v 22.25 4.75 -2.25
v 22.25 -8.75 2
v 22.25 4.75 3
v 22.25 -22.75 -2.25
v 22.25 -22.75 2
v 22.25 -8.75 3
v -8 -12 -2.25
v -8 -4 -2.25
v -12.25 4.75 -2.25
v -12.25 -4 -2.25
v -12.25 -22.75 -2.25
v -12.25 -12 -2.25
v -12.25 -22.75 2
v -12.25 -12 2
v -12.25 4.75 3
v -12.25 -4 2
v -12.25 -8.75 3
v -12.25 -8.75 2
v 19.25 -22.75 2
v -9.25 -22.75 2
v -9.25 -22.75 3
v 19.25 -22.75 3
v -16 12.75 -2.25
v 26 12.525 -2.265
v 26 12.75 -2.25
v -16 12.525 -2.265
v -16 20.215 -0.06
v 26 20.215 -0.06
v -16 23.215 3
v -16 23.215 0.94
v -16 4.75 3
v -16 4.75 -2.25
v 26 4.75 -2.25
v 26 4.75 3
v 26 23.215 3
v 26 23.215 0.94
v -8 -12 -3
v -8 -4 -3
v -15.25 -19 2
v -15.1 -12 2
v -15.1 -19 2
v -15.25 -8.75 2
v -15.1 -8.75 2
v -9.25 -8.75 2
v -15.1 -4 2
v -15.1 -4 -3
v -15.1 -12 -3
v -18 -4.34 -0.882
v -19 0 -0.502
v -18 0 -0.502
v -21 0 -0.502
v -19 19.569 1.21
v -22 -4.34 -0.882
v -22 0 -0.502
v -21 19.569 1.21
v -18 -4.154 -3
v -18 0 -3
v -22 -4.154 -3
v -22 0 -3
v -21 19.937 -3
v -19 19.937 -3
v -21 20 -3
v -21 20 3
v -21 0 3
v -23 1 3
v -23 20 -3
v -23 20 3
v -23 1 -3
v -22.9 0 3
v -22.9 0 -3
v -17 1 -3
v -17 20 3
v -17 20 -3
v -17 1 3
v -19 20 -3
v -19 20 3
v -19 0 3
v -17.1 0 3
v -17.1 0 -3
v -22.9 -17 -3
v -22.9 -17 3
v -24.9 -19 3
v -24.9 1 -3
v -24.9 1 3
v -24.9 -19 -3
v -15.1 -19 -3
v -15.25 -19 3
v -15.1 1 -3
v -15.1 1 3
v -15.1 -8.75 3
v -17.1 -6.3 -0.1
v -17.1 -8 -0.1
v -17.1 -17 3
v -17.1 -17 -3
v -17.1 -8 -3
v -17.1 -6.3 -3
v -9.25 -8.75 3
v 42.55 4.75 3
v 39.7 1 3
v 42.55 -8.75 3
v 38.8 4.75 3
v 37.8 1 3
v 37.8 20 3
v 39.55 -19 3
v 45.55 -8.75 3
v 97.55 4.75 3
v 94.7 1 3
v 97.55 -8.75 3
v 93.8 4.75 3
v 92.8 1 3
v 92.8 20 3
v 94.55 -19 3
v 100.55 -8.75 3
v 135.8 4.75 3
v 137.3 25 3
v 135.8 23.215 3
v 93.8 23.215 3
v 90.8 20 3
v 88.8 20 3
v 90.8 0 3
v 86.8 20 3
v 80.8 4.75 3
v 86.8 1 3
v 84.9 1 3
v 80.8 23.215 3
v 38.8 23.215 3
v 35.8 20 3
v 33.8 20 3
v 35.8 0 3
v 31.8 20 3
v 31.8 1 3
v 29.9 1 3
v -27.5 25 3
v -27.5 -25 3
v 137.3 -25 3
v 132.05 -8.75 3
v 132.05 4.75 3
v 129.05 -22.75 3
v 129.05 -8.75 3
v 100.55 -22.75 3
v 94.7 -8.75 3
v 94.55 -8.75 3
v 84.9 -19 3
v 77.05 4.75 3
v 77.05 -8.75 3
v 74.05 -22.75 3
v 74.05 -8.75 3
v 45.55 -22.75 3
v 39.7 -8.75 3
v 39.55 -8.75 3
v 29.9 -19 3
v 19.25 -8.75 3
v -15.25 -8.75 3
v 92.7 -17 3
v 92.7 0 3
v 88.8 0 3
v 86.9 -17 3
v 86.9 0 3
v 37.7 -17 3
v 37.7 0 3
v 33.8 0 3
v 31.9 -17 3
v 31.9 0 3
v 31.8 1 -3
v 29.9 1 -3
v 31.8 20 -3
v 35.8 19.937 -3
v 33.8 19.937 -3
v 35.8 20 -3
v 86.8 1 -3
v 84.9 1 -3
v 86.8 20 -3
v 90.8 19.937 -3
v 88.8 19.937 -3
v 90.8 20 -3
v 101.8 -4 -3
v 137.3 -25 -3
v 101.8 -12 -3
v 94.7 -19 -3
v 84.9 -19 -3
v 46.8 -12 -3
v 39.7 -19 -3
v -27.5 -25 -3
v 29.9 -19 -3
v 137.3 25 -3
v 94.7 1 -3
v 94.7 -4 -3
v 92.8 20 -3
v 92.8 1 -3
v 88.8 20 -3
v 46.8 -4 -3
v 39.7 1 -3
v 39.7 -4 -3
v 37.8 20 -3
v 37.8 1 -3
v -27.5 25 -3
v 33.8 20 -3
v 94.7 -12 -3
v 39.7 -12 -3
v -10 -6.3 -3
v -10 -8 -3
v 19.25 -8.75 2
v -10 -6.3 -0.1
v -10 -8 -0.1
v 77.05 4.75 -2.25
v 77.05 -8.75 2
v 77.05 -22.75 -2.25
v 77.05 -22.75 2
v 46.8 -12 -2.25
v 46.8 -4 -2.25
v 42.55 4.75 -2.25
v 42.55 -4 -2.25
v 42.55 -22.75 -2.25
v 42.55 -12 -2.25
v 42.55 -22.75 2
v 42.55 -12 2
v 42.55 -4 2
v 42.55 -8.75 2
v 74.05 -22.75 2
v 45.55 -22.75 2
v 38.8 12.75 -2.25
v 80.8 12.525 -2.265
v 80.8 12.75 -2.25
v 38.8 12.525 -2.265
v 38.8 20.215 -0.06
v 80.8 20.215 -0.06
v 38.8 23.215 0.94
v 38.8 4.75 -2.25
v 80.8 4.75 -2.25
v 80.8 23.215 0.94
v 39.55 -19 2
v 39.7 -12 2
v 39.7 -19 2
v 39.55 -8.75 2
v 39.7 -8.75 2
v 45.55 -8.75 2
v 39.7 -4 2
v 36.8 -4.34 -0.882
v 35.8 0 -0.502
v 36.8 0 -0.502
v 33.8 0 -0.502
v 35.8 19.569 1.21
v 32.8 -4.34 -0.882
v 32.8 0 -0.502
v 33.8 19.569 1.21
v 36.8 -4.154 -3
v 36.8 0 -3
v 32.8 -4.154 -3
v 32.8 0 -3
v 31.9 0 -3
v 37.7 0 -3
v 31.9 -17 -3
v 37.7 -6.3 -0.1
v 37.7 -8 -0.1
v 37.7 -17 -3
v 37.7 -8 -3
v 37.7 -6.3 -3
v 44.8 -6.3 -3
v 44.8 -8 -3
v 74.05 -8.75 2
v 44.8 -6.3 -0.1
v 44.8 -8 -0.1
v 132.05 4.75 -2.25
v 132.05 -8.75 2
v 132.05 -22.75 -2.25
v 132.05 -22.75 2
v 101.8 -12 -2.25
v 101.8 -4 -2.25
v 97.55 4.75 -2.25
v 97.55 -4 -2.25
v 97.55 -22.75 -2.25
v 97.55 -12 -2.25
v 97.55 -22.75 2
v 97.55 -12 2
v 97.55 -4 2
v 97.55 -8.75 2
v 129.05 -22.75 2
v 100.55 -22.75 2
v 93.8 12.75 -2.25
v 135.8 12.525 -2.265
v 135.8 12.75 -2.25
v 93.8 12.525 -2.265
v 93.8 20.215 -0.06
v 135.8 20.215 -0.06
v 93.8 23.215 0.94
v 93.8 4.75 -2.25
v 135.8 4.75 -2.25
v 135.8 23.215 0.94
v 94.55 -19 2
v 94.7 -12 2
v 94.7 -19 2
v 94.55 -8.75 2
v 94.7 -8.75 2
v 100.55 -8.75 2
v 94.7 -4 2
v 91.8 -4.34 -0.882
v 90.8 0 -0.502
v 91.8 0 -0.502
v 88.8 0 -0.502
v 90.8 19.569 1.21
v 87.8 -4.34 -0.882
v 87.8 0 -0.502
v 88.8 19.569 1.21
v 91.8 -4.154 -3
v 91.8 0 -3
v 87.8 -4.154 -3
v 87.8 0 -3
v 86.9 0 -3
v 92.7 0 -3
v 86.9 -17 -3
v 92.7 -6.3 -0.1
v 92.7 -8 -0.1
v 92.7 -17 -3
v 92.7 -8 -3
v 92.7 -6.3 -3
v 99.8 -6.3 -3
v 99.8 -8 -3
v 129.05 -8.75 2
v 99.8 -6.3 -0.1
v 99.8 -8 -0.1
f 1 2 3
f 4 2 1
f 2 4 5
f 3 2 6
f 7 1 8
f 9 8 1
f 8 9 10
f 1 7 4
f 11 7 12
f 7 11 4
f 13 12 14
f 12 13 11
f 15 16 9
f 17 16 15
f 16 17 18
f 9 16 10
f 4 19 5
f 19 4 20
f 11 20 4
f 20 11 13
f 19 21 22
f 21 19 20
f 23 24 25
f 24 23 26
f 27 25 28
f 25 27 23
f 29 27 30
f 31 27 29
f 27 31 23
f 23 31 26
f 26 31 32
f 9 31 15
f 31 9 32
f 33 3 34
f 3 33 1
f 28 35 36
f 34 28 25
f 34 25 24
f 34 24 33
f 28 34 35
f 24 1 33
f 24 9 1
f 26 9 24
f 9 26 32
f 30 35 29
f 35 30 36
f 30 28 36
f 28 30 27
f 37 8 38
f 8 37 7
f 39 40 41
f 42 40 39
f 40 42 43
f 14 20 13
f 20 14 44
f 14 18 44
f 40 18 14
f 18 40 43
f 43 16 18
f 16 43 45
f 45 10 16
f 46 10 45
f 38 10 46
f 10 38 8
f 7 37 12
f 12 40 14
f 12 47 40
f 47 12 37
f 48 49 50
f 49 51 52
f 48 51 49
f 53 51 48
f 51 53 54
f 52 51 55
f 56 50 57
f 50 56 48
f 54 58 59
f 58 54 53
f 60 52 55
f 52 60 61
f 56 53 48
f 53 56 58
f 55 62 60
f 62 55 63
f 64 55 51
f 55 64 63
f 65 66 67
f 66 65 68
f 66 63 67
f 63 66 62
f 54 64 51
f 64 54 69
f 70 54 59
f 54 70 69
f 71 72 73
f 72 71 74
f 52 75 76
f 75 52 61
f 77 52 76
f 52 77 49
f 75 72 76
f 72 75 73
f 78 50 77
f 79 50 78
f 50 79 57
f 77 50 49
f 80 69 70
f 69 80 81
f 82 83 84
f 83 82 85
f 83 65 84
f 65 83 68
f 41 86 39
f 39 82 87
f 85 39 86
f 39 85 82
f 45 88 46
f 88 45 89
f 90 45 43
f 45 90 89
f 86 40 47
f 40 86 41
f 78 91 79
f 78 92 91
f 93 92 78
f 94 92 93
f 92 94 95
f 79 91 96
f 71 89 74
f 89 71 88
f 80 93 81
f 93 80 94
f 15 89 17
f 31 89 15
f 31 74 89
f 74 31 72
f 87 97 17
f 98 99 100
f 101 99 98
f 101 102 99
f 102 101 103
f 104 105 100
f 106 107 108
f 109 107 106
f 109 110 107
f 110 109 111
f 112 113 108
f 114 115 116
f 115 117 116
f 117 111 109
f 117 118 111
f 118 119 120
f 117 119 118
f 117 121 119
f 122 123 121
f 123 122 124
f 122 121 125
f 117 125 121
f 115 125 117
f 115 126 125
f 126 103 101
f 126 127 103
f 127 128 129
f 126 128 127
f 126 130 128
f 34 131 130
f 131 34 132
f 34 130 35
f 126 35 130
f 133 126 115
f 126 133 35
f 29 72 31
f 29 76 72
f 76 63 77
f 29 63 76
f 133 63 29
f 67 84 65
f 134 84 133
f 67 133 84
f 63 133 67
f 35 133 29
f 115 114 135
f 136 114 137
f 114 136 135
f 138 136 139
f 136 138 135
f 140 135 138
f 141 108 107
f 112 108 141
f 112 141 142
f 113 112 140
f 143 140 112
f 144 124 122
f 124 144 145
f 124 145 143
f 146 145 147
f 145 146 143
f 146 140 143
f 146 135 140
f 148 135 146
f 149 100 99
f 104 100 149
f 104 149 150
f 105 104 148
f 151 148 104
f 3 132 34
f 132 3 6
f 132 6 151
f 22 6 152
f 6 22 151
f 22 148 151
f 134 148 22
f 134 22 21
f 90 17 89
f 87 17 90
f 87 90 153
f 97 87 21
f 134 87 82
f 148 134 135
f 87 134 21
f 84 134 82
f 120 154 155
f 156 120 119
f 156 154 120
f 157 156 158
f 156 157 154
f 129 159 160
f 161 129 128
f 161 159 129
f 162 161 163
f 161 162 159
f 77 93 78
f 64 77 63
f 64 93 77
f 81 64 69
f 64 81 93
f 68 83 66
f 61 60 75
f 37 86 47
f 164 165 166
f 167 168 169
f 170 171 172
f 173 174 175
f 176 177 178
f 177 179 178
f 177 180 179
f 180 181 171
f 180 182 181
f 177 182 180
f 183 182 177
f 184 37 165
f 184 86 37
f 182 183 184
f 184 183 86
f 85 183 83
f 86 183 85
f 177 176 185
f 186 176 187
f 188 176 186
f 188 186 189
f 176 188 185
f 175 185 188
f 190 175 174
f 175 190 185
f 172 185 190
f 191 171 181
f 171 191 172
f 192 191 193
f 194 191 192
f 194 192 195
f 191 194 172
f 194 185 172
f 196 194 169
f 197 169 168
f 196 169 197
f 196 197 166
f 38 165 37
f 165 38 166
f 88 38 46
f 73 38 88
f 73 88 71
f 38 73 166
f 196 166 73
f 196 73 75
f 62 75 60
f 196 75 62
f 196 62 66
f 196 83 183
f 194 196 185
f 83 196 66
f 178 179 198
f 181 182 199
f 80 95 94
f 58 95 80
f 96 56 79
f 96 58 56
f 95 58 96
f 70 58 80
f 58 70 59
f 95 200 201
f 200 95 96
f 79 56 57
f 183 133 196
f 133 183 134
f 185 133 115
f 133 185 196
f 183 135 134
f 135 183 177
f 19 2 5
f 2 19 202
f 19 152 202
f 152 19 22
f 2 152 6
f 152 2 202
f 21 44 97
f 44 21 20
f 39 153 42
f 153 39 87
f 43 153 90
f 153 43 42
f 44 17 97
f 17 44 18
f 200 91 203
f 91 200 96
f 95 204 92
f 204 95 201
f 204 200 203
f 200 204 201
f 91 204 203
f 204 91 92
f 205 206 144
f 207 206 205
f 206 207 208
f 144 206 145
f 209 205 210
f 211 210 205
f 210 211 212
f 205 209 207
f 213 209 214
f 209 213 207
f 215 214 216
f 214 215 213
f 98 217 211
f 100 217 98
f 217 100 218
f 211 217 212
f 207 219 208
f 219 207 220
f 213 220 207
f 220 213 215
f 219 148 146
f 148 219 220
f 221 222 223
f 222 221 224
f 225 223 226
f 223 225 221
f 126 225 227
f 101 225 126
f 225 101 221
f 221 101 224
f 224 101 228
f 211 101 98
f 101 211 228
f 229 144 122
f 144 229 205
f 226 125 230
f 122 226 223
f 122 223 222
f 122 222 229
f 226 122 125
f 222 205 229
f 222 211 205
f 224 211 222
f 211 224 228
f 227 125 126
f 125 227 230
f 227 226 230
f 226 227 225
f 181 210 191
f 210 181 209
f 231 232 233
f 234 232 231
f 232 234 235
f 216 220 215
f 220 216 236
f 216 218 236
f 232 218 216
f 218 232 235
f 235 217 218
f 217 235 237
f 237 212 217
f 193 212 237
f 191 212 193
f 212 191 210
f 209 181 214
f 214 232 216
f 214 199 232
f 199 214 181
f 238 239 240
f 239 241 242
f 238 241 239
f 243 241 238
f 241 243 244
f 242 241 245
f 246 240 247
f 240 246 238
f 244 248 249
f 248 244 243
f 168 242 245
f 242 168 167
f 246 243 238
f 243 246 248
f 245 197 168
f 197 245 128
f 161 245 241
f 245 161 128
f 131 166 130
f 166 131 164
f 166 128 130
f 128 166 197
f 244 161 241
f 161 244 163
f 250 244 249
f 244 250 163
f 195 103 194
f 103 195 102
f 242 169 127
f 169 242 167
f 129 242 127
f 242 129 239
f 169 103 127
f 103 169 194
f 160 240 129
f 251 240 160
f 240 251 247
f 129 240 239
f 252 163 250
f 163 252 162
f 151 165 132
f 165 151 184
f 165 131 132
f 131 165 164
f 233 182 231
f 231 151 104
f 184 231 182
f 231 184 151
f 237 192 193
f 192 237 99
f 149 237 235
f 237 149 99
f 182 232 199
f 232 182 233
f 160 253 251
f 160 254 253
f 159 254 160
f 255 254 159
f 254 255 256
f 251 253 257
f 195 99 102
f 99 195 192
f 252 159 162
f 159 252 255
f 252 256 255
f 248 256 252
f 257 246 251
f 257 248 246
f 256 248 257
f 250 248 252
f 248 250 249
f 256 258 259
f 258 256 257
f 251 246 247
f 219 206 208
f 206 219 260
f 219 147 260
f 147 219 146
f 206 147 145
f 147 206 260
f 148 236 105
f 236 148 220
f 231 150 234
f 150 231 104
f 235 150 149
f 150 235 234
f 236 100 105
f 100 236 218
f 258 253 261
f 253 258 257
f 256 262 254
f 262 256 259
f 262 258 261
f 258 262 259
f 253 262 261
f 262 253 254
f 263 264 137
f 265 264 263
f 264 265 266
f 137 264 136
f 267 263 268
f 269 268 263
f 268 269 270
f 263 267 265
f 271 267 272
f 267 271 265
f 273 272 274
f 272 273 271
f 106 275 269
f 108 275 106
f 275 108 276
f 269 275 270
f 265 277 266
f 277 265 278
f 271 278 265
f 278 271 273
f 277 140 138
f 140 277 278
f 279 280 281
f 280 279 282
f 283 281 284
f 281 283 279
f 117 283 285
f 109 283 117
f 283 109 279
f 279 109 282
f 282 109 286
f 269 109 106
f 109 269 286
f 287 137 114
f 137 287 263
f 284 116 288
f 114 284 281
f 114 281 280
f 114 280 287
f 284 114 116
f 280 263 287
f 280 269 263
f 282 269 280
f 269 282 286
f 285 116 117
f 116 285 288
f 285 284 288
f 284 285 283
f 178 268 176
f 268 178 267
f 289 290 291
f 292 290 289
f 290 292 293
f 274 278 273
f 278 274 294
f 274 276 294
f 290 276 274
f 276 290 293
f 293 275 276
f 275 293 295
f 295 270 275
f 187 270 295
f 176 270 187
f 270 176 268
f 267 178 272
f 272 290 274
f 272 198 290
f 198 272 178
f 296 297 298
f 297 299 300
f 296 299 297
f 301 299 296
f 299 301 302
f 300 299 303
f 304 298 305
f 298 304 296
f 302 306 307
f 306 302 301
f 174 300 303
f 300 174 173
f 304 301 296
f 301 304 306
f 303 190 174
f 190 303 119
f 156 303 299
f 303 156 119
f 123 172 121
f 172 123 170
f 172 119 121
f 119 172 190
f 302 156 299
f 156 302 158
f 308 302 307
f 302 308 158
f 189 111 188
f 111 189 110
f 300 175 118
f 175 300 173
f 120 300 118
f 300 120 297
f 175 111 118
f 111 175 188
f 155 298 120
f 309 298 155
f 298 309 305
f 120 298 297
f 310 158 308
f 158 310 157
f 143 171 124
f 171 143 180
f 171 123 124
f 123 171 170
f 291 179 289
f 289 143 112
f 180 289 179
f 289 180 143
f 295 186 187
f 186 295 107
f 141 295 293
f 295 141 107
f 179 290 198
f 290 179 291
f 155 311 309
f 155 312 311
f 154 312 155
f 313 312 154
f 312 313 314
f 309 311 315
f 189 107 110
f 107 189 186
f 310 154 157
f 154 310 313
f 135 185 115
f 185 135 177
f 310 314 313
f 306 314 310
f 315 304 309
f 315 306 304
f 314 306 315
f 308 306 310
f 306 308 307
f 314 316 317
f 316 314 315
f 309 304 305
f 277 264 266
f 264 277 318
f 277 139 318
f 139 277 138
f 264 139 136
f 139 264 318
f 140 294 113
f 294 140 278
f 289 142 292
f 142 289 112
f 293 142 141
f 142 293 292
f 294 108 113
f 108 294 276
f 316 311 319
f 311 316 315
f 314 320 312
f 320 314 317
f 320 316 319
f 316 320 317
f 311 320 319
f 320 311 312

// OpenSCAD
//Chromableedstudios - ds case

// Number of ds/3ds carts
number_of_carts = 3; // [1,3,9]

if(number_of_carts == 1)
{
    dsCartHolder();
}
else if (number_of_carts == 3)
{
    threeCarts();
}
else if (number_of_carts == 9)
{
    nineCarts();
}

module nineCarts()
{
    threeCarts();
    translate([0,blockY-.2,0])
    threeCarts();
    translate([0,(blockY*2)-.2,0])
    threeCarts();
}

module threeCarts()
{
    dsCartHolder();
    translate([blockX-.2,0,0])
    dsCartHolder();
    translate([(blockX*2)-.2,0,0])
    dsCartHolder();
}

module dsCartHolder()
{
    union()
    {
        difference()
        {        
            block();
                     
            union()
            {
                cart();
                clip();
            }
        }
        cartHolders();
        translate([0,0,-1.3])
        cartRetainer();
        cartRetainer();
    }
}

module cartRetainer() 
{
    translate([-10,-8,-1.7])
    rotate([0,0,90])
    cube([1.7,8,1.6]);
}

clipUpper = 20;
clipXoff = -22;
clipYoff = 10;
module clip()
{
    translate([-12,-8,-1])
    cube([8,8,6], center = true);
    
    rotate([5,0,0])
    translate([clipXoff+2,clipYoff-2.4,-3])
    cube([4,clipUpper+4,5], center = true);
    
    translate([clipXoff,clipYoff,0])
    cube([2,clipUpper,blockZ*2], center = true);
    translate([clipXoff+4,clipYoff,0])
    cube([2,clipUpper,blockZ*2], center = true);
    
    translate([clipXoff-1.9,clipYoff-clipUpper+1,0])
    cube([2,clipUpper,blockZ*2], center = true);
    translate([clipXoff+4+1.9,clipYoff-clipUpper+1,0])
    cube([2,clipUpper,blockZ*2], center = true);
    
    
    translate([clipXoff+4+1.9-4,clipYoff-clipUpper-8,0])
    rotate([0,0,90])
    cube([2,9,blockZ*2], center = true);
}

cartX = 34+.5;
cartY = 35+.5;
cartZ = 4.5;
cartXOffset = 5;
cartYOffset = -5;
cartTopX = 42;
cartTopY = 8;
module cart()
{
    translate([cartXOffset,cartYOffset,0])
   
    union()
    {
        cube([cartX,cartY,cartZ], center=true);
        translate([0,0,cartZ/2])
        cube([cartX,cartY,cartZ], center=true);
        hull()
        {
            cartTopPart(0);
            translate([0,7,1])
            cartTopPart(16);
            translate([0,10,2])
            cartTopPart(16);
        }
    }
    
        
}
module cartTopPart(rotateX)
{
    color("red")
    translate([0,(cartY/2)-cartTopY/2,0])
    rotate([rotateX,0,0])
    cube([cartTopX,cartTopY,cartZ], center=true);
    color("red")
    translate([0,(cartY/2)-cartTopY/2,cartZ/2])
    rotate([rotateX,0,0])
    cube([cartTopX,cartTopY,cartZ], center=true);
}
cartHolderX = 6;
cartHolderY = 14;
cartHolderZ = 1;
module cartHolders()
{
    translate([cartX/2,cartYOffset,(blockZ/2)-cartHolderZ/2])
    cartHolder();
    translate([-(cartX/2),cartYOffset,(blockZ/2)-cartHolderZ/2])
    cartHolder();
    
}
module cartHolder()
{
    color("blue")
    translate([cartXOffset,-((cartY/2)-cartHolderY/2),0])
    cube([cartHolderX,cartHolderY,cartHolderZ], center=true);
}

blockX = 55;
blockY = 50;
blockZ = 6;
module block()
{
    cube([blockX,blockY,blockZ], center=true);
    
}
